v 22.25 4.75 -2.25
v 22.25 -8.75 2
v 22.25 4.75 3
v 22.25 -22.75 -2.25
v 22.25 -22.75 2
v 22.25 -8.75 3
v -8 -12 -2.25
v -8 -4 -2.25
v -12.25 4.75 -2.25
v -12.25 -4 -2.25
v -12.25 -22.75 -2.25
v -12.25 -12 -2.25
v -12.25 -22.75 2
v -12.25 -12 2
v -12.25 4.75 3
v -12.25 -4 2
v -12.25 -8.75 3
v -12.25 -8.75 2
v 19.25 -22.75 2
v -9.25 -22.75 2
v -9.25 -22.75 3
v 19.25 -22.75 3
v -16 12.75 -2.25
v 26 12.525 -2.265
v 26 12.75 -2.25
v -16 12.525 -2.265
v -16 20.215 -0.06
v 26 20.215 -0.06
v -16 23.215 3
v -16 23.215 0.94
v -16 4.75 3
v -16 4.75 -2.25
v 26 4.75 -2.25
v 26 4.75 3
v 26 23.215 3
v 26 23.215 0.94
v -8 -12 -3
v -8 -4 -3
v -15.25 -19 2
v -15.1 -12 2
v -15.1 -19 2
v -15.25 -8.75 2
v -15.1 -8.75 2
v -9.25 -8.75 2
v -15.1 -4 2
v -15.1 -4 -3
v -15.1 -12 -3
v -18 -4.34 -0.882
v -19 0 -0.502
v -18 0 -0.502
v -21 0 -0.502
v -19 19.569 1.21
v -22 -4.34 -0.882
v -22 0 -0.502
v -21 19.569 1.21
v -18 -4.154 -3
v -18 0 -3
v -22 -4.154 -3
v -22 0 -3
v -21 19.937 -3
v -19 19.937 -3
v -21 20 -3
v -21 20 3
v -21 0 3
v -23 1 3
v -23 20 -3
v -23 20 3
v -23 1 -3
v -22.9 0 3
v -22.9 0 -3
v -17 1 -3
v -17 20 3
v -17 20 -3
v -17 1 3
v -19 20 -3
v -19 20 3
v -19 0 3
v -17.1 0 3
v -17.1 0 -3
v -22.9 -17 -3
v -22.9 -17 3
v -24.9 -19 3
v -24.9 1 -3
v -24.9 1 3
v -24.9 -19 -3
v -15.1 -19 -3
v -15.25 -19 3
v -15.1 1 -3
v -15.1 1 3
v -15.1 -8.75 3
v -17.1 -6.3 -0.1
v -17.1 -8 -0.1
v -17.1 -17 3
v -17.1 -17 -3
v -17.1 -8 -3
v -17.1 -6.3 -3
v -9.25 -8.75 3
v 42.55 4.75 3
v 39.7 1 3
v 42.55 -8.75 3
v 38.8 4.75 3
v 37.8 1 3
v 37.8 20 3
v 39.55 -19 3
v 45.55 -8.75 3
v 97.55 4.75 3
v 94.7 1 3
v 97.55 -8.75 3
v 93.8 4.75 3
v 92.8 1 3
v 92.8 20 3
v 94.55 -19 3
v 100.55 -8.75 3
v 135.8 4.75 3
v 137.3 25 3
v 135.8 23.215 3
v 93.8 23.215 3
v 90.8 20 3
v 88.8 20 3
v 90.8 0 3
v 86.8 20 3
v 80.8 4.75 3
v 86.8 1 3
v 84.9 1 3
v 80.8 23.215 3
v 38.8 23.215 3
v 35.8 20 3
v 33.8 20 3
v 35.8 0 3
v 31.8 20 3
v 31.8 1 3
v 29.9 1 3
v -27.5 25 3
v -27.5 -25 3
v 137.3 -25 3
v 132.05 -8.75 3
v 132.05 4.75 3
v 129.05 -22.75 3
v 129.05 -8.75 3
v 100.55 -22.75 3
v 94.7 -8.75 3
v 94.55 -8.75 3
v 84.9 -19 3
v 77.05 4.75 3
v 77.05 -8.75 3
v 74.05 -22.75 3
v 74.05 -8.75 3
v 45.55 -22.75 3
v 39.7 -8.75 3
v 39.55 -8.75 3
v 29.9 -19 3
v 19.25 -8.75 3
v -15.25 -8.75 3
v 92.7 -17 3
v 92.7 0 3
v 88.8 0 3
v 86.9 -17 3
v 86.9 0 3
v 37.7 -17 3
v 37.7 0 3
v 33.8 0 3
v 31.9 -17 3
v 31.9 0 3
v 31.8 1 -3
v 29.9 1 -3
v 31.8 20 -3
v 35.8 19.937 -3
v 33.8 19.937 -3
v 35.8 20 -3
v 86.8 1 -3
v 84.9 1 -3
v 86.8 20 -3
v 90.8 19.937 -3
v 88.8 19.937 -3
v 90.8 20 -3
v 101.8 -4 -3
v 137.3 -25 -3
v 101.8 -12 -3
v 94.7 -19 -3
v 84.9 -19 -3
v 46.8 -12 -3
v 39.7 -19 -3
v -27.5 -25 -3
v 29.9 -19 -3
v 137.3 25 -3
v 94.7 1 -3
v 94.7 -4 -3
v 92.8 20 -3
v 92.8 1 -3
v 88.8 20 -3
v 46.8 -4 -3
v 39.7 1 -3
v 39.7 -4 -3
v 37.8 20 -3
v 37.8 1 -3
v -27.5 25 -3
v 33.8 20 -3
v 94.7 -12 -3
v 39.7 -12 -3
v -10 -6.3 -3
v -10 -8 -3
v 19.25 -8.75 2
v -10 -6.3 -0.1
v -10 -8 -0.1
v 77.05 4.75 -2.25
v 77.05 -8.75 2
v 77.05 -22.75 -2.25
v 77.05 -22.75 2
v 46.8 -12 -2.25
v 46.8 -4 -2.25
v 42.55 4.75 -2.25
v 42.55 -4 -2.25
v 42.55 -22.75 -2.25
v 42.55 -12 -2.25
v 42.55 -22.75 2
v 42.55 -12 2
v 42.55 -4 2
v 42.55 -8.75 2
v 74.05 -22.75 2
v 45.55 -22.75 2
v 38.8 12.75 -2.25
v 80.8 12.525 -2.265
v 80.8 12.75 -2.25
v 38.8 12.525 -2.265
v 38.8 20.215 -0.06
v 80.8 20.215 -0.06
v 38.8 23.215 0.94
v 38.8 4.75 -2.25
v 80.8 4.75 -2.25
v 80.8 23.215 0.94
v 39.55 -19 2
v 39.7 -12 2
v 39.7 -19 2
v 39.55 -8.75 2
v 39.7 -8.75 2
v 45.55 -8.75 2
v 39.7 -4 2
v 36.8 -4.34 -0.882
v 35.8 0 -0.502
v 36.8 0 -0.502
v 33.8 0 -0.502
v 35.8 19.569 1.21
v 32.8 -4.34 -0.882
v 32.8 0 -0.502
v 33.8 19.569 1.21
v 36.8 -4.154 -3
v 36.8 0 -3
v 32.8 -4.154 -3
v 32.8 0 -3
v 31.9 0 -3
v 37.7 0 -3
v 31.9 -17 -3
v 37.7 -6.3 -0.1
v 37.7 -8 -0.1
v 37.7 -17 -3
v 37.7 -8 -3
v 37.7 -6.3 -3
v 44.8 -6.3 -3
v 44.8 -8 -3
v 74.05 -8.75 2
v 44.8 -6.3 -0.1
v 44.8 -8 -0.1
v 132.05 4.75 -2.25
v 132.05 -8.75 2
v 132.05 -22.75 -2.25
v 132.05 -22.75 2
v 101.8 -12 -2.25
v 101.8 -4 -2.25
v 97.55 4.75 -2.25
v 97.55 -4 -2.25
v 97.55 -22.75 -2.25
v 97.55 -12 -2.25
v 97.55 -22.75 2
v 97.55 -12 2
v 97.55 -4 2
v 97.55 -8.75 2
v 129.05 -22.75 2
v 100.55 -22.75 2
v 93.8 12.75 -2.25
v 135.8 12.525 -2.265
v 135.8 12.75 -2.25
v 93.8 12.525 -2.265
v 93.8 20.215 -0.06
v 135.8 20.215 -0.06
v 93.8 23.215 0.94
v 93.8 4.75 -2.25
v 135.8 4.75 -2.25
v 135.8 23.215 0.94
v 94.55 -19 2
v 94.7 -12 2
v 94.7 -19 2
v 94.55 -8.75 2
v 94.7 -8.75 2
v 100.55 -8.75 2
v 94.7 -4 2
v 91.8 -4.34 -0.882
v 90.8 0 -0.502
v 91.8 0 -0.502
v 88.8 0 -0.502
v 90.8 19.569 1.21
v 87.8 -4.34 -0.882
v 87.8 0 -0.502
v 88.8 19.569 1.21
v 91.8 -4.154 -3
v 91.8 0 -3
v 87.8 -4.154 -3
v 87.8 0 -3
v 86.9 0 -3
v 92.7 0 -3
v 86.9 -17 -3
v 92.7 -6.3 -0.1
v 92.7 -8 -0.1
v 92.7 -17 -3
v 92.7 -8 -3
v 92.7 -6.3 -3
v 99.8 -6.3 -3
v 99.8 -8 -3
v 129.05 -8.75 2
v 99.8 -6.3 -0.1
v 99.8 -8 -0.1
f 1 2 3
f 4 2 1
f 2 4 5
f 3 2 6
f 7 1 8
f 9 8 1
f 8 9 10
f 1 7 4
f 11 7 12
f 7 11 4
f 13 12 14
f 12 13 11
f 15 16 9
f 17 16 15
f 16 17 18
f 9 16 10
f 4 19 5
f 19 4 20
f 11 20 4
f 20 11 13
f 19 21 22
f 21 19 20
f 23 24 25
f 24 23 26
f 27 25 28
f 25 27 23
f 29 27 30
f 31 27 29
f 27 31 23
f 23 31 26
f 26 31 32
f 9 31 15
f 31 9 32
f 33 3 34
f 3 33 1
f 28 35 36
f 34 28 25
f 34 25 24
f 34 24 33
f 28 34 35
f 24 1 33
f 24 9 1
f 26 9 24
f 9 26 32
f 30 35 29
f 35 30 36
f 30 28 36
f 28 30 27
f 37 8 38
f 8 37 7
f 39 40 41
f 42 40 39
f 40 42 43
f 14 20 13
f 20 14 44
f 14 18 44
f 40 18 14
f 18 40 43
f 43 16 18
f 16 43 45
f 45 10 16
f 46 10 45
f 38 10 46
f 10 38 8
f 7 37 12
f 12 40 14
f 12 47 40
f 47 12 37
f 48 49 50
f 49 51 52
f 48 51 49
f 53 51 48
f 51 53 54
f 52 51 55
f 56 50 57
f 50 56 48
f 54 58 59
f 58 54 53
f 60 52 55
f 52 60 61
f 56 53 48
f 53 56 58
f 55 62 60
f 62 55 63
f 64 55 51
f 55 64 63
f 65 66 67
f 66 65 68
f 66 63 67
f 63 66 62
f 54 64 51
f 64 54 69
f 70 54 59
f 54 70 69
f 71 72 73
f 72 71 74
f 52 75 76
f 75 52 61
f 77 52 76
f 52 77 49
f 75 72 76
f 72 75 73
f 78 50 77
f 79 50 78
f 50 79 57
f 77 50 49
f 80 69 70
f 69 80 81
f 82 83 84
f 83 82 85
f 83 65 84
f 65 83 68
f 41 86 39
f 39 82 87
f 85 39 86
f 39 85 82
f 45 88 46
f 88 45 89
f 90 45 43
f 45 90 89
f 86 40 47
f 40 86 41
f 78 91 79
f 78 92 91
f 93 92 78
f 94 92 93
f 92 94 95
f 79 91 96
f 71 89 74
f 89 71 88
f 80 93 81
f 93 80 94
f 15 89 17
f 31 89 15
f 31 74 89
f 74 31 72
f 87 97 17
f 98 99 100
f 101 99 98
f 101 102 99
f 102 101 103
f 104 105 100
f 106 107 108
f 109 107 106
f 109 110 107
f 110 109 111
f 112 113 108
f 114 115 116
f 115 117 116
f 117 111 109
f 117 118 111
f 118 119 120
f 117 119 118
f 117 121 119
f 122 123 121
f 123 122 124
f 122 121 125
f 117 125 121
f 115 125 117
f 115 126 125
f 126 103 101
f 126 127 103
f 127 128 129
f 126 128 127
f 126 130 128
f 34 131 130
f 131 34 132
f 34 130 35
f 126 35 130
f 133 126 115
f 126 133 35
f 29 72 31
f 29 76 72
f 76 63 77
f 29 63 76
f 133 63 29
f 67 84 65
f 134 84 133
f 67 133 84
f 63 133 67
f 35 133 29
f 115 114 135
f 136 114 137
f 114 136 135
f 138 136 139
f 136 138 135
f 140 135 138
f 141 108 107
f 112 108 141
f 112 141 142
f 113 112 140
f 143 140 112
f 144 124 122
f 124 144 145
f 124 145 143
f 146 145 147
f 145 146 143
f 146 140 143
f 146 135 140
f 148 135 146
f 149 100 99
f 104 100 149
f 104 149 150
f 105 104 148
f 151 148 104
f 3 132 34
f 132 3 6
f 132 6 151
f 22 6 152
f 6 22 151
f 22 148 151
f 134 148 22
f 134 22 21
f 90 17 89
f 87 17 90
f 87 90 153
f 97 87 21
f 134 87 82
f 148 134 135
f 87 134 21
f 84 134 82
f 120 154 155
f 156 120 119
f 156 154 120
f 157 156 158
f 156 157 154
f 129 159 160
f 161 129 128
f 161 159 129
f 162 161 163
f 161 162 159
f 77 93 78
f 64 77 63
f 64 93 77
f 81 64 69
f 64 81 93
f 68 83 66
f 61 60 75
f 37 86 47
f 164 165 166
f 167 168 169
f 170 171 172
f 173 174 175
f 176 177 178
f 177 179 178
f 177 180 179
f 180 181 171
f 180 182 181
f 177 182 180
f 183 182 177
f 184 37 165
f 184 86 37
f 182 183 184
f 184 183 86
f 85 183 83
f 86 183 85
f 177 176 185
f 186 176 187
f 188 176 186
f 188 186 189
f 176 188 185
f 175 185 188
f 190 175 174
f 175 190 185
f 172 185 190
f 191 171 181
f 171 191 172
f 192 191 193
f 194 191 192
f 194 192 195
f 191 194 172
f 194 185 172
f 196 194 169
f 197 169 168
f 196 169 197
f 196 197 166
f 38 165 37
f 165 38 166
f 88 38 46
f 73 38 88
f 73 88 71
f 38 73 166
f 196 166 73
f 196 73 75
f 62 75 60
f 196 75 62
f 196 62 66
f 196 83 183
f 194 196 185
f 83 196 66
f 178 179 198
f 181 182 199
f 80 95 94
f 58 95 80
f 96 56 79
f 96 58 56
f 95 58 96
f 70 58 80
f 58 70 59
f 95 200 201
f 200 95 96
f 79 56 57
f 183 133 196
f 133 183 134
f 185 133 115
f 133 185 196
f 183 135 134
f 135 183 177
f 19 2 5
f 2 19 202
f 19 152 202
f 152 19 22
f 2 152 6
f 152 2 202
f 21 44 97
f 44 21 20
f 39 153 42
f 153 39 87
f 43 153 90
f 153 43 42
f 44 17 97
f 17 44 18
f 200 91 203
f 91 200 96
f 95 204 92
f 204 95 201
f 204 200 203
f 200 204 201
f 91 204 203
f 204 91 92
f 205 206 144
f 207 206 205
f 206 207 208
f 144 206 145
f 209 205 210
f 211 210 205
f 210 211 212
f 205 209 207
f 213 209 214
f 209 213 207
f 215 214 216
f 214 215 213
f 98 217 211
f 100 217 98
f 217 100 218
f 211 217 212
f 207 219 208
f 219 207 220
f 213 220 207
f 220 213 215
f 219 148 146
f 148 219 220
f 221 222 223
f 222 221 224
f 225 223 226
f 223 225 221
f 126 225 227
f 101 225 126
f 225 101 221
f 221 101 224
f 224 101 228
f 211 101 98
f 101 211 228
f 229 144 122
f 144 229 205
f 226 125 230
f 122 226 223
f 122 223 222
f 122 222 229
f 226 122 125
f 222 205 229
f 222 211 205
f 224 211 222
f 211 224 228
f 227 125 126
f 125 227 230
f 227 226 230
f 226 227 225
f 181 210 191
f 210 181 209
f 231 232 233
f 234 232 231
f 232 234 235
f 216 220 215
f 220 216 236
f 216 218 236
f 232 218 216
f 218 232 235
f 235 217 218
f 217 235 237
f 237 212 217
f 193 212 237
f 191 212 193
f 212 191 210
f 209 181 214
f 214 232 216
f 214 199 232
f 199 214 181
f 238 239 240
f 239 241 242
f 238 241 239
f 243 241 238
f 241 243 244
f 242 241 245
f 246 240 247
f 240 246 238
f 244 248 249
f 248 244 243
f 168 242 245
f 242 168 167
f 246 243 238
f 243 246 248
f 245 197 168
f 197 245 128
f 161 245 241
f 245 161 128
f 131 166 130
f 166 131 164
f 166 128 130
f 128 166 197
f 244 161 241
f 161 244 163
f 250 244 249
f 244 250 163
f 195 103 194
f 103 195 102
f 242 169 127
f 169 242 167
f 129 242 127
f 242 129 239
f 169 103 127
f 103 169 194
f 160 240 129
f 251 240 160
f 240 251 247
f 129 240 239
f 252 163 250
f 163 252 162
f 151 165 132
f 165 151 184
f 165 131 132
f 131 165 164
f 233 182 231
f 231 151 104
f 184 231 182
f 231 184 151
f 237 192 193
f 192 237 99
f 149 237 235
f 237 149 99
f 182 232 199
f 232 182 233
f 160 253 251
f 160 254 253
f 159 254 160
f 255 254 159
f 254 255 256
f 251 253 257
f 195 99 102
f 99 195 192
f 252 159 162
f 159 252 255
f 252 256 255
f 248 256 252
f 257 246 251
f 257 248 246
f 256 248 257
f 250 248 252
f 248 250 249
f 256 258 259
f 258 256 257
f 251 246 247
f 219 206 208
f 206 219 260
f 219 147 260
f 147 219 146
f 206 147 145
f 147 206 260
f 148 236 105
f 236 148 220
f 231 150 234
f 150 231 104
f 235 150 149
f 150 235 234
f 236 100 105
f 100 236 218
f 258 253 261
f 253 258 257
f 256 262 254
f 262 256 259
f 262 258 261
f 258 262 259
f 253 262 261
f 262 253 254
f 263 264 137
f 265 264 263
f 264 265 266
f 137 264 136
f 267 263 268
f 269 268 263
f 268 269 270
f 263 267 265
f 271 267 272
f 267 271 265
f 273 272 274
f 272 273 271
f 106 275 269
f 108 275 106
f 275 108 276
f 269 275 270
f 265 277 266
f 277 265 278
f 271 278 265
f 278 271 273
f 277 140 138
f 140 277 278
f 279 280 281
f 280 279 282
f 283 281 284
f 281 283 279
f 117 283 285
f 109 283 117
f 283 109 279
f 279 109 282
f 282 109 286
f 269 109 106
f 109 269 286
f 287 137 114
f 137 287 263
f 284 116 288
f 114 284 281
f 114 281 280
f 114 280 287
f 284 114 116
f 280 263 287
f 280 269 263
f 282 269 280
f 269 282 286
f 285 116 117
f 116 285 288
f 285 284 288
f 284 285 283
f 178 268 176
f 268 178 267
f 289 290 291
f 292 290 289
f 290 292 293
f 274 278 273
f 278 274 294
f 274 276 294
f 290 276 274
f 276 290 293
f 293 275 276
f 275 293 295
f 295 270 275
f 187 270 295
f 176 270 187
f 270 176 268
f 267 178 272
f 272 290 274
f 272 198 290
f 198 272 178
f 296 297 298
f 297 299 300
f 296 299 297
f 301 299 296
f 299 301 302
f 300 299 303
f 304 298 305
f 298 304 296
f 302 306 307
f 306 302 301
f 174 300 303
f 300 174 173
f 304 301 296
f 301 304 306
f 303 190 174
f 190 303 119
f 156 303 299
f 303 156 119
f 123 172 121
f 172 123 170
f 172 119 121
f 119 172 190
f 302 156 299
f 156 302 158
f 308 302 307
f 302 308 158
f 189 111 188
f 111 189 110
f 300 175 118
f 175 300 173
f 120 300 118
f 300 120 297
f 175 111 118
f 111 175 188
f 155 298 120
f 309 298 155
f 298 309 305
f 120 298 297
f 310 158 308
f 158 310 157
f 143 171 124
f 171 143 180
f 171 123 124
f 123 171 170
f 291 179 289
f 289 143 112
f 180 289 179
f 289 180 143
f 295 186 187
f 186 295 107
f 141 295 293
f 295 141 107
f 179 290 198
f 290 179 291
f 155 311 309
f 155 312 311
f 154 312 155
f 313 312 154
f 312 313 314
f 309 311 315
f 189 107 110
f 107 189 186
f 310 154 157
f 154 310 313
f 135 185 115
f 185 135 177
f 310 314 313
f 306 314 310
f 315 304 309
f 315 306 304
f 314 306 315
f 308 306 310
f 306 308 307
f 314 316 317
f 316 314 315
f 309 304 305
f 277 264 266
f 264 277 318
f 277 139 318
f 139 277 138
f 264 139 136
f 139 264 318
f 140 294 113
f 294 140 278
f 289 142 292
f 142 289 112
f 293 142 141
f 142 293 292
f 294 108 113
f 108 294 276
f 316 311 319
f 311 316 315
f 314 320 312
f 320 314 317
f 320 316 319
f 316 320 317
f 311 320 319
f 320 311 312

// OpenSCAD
//Chromableedstudios - ds case

// Number of ds/3ds carts
number_of_carts = 3; // [1,3,9]

if(number_of_carts == 1)
{
    dsCartHolder();
}
else if (number_of_carts == 3)
{
    threeCarts();
}
else if (number_of_carts == 9)
{
    nineCarts();
}

module nineCarts()
{
    threeCarts();
    translate([0,blockY-.2,0])
    threeCarts();
    translate([0,(blockY*2)-.2,0])
    threeCarts();
}

module threeCarts()
{
    dsCartHolder();
    translate([blockX-.2,0,0])
    dsCartHolder();
    translate([(blockX*2)-.2,0,0])
    dsCartHolder();
}

module dsCartHolder()
{
    union()
    {
        difference()
        {        
            block();
                     
            union()
            {
                cart();
                clip();
            }
        }
        cartHolders();
        translate([0,0,-1.3])
        cartRetainer();
        cartRetainer();
    }
}

module cartRetainer() 
{
    translate([-10,-8,-1.7])
    rotate([0,0,90])
    cube([1.7,8,1.6]);
}

clipUpper = 20;
clipXoff = -22;
clipYoff = 10;
module clip()
{
    translate([-12,-8,-1])
    cube([8,8,6], center = true);
    
    rotate([5,0,0])
    translate([clipXoff+2,clipYoff-2.4,-3])
    cube([4,clipUpper+4,5], center = true);
    
    translate([clipXoff,clipYoff,0])
    cube([2,clipUpper,blockZ*2], center = true);
    translate([clipXoff+4,clipYoff,0])
    cube([2,clipUpper,blockZ*2], center = true);
    
    translate([clipXoff-1.9,clipYoff-clipUpper+1,0])
    cube([2,clipUpper,blockZ*2], center = true);
    translate([clipXoff+4+1.9,clipYoff-clipUpper+1,0])
    cube([2,clipUpper,blockZ*2], center = true);
    
    
    translate([clipXoff+4+1.9-4,clipYoff-clipUpper-8,0])
    rotate([0,0,90])
    cube([2,9,blockZ*2], center = true);
}

cartX = 34+.5;
cartY = 35+.5;
cartZ = 4.5;
cartXOffset = 5;
cartYOffset = -5;
cartTopX = 42;
cartTopY = 8;
module cart()
{
    translate([cartXOffset,cartYOffset,0])
   
    union()
    {
        cube([cartX,cartY,cartZ], center=true);
        translate([0,0,cartZ/2])
        cube([cartX,cartY,cartZ], center=true);
        hull()
        {
            cartTopPart(0);
            translate([0,7,1])
            cartTopPart(16);
            translate([0,10,2])
            cartTopPart(16);
        }
    }
    
        
}
module cartTopPart(rotateX)
{
    color("red")
    translate([0,(cartY/2)-cartTopY/2,0])
    rotate([rotateX,0,0])
    cube([cartTopX,cartTopY,cartZ], center=true);
    color("red")
    translate([0,(cartY/2)-cartTopY/2,cartZ/2])
    rotate([rotateX,0,0])
    cube([cartTopX,cartTopY,cartZ], center=true);
}
cartHolderX = 6;
cartHolderY = 14;
cartHolderZ = 1;
module cartHolders()
{
    translate([cartX/2,cartYOffset,(blockZ/2)-cartHolderZ/2])
    cartHolder();
    translate([-(cartX/2),cartYOffset,(blockZ/2)-cartHolderZ/2])
    cartHolder();
    
}
module cartHolder()
{
    color("blue")
    translate([cartXOffset,-((cartY/2)-cartHolderY/2),0])
    cube([cartHolderX,cartHolderY,cartHolderZ], center=true);
}

blockX = 55;
blockY = 50;
blockZ = 6;
module block()
{
    cube([blockX,blockY,blockZ], center=true);
    
}
